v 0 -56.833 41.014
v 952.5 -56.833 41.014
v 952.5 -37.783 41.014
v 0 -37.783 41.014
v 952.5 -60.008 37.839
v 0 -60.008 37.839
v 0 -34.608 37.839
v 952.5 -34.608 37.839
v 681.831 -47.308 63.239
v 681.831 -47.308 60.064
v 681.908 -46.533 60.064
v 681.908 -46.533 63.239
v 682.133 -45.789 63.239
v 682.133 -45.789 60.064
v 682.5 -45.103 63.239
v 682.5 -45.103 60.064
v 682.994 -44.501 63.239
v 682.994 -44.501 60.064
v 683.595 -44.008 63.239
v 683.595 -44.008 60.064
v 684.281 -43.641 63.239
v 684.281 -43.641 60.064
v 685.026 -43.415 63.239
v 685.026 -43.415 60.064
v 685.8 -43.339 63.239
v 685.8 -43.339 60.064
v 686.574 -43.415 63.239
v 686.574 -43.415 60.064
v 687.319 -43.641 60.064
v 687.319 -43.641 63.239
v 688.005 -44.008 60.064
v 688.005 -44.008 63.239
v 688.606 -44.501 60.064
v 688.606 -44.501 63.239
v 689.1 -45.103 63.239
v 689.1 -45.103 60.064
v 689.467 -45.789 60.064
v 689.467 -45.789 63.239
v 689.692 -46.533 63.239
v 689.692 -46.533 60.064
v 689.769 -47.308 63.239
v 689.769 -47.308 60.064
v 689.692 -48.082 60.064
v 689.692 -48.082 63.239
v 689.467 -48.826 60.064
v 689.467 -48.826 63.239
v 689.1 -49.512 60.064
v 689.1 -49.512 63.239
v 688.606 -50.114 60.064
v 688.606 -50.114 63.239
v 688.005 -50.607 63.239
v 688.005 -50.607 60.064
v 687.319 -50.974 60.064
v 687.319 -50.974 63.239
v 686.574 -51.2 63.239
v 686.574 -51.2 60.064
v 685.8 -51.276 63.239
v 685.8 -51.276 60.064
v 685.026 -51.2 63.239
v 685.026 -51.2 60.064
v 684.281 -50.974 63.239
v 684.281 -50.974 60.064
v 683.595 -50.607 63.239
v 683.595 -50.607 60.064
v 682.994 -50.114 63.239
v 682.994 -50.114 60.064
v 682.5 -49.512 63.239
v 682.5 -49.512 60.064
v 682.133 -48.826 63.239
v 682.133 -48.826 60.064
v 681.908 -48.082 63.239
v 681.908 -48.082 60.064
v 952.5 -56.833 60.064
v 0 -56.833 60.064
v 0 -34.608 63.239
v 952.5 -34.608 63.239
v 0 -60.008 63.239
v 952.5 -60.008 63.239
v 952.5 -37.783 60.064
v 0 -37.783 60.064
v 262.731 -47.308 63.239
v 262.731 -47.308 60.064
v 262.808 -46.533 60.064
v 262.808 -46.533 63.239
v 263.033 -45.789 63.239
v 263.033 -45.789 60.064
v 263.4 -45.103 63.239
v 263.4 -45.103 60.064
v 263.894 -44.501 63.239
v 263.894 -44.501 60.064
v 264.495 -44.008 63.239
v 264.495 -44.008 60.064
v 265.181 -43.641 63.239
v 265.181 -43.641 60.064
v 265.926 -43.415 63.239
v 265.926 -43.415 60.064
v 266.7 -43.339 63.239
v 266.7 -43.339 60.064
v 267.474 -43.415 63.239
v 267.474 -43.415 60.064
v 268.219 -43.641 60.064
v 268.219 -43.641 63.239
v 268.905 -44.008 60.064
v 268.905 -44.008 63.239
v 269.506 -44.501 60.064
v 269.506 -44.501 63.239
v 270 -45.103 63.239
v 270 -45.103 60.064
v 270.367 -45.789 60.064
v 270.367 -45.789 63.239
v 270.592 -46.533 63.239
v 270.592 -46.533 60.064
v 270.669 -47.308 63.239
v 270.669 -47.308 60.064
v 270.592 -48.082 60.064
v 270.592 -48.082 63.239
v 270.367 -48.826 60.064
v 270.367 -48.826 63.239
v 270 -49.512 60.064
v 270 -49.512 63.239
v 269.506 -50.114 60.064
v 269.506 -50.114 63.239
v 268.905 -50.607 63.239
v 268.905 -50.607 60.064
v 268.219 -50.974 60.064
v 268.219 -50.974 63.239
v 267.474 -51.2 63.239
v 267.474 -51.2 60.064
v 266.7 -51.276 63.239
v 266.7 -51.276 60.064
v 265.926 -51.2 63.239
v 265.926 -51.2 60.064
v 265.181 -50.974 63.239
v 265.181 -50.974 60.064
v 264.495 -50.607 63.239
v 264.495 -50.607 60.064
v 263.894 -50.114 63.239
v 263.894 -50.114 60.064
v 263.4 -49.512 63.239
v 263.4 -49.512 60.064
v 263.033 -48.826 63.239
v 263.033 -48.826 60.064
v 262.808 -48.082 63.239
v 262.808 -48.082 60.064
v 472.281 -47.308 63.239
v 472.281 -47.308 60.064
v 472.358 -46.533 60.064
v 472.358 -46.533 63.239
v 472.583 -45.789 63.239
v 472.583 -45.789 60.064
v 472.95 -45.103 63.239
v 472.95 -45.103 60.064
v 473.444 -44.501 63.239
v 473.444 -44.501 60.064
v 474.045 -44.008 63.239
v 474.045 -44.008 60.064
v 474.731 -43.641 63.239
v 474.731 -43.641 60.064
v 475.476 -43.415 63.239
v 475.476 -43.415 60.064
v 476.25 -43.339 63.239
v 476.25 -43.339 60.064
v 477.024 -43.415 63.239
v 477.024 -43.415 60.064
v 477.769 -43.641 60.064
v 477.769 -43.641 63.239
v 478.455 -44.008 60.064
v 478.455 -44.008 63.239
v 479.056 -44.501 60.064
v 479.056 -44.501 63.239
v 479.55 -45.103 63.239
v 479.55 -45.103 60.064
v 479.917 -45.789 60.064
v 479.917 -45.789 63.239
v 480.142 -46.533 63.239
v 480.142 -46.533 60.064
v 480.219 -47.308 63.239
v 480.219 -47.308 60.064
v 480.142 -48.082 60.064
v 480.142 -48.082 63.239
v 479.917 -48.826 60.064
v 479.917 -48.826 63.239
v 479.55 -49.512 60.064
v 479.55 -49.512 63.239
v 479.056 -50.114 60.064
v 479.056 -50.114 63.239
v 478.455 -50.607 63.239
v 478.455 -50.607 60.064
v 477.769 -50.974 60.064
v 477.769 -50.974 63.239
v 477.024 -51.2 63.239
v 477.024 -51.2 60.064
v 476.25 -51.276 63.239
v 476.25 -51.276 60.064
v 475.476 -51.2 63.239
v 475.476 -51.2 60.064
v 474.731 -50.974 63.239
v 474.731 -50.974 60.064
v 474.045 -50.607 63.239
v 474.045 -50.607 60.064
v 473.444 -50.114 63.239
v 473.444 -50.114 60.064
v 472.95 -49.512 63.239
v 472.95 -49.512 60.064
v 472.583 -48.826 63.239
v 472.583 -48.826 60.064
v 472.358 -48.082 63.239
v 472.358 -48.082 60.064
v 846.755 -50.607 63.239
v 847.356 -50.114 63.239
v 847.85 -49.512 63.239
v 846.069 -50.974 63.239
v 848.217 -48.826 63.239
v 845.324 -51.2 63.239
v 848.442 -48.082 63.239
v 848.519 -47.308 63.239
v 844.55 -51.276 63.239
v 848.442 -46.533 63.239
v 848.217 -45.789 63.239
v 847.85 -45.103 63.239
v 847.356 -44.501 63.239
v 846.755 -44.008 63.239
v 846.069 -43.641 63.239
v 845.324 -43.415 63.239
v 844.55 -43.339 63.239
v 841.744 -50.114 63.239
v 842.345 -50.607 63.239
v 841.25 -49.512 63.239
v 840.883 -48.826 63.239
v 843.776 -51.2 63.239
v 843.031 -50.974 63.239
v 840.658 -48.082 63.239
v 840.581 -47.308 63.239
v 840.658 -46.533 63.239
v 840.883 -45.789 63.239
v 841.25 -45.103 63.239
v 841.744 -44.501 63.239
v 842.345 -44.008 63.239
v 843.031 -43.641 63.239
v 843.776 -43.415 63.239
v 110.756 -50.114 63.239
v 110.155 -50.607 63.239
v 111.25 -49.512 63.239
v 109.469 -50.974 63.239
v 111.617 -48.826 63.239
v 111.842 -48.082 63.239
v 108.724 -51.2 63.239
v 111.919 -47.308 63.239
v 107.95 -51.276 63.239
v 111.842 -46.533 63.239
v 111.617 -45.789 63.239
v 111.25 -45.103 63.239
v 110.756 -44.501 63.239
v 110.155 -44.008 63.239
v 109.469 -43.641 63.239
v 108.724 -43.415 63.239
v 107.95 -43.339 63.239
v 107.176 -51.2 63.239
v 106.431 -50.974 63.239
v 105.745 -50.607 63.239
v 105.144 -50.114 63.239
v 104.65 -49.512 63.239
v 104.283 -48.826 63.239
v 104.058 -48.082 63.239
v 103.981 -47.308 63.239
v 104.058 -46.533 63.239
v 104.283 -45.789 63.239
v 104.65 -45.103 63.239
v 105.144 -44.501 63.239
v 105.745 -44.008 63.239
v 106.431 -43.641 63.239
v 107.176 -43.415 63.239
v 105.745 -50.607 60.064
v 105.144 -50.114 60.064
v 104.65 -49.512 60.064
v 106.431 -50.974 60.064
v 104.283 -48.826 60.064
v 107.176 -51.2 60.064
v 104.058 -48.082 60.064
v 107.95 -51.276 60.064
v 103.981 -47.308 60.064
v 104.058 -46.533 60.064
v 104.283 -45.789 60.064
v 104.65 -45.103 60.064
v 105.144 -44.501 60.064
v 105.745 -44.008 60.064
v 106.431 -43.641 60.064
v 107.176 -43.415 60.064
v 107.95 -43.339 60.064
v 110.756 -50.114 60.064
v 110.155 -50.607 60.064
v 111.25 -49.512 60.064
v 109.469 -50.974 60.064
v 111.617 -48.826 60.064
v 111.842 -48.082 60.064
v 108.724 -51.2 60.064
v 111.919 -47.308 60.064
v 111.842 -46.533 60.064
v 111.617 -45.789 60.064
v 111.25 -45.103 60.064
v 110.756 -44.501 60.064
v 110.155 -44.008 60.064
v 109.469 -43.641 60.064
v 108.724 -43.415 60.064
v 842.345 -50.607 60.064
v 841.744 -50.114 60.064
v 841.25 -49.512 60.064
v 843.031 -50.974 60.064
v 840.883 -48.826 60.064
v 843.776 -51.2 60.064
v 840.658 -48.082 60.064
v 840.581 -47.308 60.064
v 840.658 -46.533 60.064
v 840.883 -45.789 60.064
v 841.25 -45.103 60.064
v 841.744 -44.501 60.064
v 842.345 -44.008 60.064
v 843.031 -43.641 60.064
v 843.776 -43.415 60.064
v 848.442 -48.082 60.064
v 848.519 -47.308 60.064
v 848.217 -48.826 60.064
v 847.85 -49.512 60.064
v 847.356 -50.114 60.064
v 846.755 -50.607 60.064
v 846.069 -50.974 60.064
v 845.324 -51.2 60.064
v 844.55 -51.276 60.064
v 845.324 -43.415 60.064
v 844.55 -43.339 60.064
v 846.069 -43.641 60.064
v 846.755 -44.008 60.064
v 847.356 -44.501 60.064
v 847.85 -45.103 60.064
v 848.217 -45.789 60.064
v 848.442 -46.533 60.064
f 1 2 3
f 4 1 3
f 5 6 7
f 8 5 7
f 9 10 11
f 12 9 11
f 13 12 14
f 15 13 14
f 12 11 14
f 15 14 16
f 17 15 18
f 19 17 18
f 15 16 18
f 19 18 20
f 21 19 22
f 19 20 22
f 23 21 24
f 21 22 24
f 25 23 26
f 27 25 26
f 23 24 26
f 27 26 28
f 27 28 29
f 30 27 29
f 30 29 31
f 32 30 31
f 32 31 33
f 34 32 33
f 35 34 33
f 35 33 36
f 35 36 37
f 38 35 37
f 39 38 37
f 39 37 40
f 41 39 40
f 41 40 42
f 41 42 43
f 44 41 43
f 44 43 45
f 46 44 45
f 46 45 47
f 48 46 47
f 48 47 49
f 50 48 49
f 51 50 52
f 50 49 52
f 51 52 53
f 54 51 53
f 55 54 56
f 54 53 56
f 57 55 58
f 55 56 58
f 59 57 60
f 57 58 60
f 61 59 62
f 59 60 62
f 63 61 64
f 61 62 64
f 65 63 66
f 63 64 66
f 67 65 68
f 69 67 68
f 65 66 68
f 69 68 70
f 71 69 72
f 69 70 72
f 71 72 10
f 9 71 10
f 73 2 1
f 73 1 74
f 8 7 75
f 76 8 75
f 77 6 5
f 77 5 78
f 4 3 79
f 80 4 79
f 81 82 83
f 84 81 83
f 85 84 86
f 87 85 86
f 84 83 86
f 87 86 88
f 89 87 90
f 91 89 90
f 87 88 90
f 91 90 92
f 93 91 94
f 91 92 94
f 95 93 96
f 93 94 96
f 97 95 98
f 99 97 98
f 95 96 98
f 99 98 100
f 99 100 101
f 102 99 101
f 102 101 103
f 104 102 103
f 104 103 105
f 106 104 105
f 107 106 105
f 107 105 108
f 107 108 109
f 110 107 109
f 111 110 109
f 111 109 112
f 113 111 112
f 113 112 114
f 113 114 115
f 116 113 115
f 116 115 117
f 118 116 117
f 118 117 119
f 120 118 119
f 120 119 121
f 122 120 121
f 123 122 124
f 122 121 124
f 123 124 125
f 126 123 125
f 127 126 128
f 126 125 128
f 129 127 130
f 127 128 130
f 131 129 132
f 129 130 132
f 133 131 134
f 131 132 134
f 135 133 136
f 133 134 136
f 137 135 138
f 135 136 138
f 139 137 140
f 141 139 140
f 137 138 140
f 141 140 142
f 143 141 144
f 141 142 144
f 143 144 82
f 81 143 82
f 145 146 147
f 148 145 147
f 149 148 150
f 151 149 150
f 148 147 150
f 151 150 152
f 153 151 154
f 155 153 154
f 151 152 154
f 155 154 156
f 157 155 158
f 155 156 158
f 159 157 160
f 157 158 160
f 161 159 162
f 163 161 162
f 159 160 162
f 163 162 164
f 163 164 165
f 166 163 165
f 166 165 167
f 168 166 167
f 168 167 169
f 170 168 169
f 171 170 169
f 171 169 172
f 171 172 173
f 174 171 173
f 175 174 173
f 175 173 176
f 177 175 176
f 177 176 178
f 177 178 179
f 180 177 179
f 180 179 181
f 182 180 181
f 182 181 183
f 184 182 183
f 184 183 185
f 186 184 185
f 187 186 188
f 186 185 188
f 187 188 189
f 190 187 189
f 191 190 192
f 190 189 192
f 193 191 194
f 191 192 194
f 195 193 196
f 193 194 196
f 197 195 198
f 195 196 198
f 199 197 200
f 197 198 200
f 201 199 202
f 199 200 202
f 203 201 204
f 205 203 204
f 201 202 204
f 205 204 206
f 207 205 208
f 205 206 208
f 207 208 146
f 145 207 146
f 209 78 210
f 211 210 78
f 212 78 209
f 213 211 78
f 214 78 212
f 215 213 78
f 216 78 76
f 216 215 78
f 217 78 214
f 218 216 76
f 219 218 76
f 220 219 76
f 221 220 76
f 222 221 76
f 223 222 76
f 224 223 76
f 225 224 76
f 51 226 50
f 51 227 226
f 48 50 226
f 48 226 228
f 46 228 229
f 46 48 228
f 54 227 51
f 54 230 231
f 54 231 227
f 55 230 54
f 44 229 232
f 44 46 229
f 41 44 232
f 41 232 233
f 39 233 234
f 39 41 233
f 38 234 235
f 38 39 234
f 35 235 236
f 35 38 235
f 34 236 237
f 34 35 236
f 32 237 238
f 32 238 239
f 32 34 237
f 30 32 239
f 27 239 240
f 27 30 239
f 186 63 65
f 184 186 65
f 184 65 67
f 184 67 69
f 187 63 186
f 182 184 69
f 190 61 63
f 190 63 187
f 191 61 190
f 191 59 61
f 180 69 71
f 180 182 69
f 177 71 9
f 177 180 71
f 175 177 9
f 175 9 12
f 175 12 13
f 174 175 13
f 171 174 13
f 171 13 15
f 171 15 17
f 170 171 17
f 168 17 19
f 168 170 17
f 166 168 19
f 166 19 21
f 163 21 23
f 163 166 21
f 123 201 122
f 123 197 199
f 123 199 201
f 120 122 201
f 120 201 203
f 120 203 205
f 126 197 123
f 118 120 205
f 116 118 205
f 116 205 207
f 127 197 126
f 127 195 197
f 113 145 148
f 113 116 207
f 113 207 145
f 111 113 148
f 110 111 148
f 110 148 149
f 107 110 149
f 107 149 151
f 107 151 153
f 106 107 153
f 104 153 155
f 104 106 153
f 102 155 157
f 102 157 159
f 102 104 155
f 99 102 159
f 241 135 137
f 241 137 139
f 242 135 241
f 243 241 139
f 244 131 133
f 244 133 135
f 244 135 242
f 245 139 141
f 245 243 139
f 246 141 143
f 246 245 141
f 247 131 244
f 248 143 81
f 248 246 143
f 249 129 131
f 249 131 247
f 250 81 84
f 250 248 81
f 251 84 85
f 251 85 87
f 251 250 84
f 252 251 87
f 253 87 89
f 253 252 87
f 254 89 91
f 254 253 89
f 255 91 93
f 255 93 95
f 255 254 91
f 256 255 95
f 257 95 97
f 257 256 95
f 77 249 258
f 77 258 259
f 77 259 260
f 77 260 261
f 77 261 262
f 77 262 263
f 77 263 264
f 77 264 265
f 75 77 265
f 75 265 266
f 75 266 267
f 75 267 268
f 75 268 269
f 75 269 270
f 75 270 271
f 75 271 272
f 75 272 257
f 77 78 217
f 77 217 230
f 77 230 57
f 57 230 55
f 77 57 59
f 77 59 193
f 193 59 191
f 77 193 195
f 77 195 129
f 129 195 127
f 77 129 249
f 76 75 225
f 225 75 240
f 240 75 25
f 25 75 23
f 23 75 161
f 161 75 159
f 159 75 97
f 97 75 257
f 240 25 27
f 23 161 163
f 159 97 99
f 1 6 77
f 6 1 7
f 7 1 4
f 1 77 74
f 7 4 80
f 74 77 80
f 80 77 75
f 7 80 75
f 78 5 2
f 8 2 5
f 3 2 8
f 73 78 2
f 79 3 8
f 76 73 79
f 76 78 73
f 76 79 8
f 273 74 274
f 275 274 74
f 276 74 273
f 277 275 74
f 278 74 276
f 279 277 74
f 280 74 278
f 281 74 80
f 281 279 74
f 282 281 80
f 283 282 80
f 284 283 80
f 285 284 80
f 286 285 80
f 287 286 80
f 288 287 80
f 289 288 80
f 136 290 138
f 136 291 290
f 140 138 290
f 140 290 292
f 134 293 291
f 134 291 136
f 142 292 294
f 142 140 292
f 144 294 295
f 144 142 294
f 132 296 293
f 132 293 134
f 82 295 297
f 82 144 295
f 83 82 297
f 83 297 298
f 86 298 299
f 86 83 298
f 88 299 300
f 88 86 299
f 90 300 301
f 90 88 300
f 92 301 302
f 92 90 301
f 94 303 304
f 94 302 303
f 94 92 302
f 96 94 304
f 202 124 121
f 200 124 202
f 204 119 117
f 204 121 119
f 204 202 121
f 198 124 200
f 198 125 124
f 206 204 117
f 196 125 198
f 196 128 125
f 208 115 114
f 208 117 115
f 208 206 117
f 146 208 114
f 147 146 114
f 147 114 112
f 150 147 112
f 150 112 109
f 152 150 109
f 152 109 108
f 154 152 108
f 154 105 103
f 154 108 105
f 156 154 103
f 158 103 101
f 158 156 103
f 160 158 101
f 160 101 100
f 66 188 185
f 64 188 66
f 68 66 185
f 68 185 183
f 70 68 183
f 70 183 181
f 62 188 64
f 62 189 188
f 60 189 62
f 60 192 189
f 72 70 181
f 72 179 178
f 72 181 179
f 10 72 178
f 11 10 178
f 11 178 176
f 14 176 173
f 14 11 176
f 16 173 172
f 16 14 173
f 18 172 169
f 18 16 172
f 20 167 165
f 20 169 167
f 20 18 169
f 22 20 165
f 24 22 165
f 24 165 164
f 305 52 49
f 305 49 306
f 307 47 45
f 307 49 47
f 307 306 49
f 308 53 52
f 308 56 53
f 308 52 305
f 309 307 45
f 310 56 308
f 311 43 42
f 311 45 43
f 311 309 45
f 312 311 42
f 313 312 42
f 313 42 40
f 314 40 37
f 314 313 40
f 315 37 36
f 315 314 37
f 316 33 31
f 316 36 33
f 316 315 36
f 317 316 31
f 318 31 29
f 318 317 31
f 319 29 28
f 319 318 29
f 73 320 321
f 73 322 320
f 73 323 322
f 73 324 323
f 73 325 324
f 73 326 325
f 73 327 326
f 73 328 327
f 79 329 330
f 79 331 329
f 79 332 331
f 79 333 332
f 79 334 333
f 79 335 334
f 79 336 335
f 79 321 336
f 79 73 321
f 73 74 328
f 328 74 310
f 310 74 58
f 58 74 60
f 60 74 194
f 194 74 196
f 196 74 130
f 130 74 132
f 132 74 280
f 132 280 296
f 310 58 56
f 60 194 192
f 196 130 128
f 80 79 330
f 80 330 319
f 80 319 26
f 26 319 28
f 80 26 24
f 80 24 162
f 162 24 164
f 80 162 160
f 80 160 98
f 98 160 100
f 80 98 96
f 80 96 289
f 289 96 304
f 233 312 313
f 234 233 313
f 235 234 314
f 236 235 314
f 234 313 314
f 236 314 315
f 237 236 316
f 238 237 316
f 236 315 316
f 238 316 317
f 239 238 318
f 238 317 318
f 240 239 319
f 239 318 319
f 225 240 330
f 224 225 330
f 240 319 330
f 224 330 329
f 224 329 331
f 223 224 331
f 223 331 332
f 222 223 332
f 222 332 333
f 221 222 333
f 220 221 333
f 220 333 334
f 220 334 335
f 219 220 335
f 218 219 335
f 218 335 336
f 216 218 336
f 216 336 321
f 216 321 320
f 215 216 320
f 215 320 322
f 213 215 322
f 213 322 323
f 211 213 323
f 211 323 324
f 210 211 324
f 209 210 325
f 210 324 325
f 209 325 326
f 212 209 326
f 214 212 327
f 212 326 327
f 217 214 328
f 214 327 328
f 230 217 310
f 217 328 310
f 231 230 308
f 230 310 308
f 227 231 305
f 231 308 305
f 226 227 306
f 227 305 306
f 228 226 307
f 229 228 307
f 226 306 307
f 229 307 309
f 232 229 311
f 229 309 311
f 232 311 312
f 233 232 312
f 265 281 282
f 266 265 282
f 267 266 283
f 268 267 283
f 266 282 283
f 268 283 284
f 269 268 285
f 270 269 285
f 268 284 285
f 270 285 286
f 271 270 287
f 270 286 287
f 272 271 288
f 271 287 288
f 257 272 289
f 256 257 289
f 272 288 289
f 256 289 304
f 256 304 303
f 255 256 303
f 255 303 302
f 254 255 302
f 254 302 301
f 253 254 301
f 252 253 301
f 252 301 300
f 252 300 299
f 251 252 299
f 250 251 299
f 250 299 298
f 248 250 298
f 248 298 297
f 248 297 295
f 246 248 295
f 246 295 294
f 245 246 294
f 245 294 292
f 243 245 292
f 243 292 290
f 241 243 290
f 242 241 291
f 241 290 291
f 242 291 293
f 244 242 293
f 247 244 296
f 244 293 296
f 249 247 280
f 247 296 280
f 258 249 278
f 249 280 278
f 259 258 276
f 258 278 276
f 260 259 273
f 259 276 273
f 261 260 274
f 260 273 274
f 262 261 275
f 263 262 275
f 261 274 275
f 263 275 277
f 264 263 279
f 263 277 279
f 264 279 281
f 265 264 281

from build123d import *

# Parameters (mm, degrees)
F0_W     = 25.4
F0_H     = 25.4
F1_DEPTH = 952.5
F2_W     = 19.05
F2_H     = 19.05
F3_DEPTH = 952.501
F5_D     = 7.9375
F5_DEPTH = 17.4752
F5_TIP   = 2.3846655818


with BuildPart() as f1:
    # F0 (on Right) → F1 (new body)
    with BuildSketch(Plane.YZ):
        with Locations((-47.3075013936, 50.5391221166)):
            Rectangle(F0_W, F0_H)
    extrude(amount=F1_DEPTH)

    # F2 (on face) → F3 (cut, through all)
    with BuildSketch(Plane.YZ.offset(952.5)):
        with Locations((-47.3075013936, 50.5391221166)):
            Rectangle(F2_W, F2_H)
    extrude(amount=-F3_DEPTH, mode=Mode.SUBTRACT)

    # F5
    with Locations(Plane.XY.offset(63.2391221166)):
        with Locations((844.55, -47.3075013936), (685.8, -47.3075013936), (476.25, -47.3075013936), (266.7, -47.3075013936), (107.95, -47.3075013936)):
            Hole(F5_D / 2, depth=F5_DEPTH)
            with Locations((0, 0, -(F5_DEPTH + F5_TIP / 2))):  # 118° drill point
                Cone(0, F5_D / 2, F5_TIP, mode=Mode.SUBTRACT)


solid = f1.part
